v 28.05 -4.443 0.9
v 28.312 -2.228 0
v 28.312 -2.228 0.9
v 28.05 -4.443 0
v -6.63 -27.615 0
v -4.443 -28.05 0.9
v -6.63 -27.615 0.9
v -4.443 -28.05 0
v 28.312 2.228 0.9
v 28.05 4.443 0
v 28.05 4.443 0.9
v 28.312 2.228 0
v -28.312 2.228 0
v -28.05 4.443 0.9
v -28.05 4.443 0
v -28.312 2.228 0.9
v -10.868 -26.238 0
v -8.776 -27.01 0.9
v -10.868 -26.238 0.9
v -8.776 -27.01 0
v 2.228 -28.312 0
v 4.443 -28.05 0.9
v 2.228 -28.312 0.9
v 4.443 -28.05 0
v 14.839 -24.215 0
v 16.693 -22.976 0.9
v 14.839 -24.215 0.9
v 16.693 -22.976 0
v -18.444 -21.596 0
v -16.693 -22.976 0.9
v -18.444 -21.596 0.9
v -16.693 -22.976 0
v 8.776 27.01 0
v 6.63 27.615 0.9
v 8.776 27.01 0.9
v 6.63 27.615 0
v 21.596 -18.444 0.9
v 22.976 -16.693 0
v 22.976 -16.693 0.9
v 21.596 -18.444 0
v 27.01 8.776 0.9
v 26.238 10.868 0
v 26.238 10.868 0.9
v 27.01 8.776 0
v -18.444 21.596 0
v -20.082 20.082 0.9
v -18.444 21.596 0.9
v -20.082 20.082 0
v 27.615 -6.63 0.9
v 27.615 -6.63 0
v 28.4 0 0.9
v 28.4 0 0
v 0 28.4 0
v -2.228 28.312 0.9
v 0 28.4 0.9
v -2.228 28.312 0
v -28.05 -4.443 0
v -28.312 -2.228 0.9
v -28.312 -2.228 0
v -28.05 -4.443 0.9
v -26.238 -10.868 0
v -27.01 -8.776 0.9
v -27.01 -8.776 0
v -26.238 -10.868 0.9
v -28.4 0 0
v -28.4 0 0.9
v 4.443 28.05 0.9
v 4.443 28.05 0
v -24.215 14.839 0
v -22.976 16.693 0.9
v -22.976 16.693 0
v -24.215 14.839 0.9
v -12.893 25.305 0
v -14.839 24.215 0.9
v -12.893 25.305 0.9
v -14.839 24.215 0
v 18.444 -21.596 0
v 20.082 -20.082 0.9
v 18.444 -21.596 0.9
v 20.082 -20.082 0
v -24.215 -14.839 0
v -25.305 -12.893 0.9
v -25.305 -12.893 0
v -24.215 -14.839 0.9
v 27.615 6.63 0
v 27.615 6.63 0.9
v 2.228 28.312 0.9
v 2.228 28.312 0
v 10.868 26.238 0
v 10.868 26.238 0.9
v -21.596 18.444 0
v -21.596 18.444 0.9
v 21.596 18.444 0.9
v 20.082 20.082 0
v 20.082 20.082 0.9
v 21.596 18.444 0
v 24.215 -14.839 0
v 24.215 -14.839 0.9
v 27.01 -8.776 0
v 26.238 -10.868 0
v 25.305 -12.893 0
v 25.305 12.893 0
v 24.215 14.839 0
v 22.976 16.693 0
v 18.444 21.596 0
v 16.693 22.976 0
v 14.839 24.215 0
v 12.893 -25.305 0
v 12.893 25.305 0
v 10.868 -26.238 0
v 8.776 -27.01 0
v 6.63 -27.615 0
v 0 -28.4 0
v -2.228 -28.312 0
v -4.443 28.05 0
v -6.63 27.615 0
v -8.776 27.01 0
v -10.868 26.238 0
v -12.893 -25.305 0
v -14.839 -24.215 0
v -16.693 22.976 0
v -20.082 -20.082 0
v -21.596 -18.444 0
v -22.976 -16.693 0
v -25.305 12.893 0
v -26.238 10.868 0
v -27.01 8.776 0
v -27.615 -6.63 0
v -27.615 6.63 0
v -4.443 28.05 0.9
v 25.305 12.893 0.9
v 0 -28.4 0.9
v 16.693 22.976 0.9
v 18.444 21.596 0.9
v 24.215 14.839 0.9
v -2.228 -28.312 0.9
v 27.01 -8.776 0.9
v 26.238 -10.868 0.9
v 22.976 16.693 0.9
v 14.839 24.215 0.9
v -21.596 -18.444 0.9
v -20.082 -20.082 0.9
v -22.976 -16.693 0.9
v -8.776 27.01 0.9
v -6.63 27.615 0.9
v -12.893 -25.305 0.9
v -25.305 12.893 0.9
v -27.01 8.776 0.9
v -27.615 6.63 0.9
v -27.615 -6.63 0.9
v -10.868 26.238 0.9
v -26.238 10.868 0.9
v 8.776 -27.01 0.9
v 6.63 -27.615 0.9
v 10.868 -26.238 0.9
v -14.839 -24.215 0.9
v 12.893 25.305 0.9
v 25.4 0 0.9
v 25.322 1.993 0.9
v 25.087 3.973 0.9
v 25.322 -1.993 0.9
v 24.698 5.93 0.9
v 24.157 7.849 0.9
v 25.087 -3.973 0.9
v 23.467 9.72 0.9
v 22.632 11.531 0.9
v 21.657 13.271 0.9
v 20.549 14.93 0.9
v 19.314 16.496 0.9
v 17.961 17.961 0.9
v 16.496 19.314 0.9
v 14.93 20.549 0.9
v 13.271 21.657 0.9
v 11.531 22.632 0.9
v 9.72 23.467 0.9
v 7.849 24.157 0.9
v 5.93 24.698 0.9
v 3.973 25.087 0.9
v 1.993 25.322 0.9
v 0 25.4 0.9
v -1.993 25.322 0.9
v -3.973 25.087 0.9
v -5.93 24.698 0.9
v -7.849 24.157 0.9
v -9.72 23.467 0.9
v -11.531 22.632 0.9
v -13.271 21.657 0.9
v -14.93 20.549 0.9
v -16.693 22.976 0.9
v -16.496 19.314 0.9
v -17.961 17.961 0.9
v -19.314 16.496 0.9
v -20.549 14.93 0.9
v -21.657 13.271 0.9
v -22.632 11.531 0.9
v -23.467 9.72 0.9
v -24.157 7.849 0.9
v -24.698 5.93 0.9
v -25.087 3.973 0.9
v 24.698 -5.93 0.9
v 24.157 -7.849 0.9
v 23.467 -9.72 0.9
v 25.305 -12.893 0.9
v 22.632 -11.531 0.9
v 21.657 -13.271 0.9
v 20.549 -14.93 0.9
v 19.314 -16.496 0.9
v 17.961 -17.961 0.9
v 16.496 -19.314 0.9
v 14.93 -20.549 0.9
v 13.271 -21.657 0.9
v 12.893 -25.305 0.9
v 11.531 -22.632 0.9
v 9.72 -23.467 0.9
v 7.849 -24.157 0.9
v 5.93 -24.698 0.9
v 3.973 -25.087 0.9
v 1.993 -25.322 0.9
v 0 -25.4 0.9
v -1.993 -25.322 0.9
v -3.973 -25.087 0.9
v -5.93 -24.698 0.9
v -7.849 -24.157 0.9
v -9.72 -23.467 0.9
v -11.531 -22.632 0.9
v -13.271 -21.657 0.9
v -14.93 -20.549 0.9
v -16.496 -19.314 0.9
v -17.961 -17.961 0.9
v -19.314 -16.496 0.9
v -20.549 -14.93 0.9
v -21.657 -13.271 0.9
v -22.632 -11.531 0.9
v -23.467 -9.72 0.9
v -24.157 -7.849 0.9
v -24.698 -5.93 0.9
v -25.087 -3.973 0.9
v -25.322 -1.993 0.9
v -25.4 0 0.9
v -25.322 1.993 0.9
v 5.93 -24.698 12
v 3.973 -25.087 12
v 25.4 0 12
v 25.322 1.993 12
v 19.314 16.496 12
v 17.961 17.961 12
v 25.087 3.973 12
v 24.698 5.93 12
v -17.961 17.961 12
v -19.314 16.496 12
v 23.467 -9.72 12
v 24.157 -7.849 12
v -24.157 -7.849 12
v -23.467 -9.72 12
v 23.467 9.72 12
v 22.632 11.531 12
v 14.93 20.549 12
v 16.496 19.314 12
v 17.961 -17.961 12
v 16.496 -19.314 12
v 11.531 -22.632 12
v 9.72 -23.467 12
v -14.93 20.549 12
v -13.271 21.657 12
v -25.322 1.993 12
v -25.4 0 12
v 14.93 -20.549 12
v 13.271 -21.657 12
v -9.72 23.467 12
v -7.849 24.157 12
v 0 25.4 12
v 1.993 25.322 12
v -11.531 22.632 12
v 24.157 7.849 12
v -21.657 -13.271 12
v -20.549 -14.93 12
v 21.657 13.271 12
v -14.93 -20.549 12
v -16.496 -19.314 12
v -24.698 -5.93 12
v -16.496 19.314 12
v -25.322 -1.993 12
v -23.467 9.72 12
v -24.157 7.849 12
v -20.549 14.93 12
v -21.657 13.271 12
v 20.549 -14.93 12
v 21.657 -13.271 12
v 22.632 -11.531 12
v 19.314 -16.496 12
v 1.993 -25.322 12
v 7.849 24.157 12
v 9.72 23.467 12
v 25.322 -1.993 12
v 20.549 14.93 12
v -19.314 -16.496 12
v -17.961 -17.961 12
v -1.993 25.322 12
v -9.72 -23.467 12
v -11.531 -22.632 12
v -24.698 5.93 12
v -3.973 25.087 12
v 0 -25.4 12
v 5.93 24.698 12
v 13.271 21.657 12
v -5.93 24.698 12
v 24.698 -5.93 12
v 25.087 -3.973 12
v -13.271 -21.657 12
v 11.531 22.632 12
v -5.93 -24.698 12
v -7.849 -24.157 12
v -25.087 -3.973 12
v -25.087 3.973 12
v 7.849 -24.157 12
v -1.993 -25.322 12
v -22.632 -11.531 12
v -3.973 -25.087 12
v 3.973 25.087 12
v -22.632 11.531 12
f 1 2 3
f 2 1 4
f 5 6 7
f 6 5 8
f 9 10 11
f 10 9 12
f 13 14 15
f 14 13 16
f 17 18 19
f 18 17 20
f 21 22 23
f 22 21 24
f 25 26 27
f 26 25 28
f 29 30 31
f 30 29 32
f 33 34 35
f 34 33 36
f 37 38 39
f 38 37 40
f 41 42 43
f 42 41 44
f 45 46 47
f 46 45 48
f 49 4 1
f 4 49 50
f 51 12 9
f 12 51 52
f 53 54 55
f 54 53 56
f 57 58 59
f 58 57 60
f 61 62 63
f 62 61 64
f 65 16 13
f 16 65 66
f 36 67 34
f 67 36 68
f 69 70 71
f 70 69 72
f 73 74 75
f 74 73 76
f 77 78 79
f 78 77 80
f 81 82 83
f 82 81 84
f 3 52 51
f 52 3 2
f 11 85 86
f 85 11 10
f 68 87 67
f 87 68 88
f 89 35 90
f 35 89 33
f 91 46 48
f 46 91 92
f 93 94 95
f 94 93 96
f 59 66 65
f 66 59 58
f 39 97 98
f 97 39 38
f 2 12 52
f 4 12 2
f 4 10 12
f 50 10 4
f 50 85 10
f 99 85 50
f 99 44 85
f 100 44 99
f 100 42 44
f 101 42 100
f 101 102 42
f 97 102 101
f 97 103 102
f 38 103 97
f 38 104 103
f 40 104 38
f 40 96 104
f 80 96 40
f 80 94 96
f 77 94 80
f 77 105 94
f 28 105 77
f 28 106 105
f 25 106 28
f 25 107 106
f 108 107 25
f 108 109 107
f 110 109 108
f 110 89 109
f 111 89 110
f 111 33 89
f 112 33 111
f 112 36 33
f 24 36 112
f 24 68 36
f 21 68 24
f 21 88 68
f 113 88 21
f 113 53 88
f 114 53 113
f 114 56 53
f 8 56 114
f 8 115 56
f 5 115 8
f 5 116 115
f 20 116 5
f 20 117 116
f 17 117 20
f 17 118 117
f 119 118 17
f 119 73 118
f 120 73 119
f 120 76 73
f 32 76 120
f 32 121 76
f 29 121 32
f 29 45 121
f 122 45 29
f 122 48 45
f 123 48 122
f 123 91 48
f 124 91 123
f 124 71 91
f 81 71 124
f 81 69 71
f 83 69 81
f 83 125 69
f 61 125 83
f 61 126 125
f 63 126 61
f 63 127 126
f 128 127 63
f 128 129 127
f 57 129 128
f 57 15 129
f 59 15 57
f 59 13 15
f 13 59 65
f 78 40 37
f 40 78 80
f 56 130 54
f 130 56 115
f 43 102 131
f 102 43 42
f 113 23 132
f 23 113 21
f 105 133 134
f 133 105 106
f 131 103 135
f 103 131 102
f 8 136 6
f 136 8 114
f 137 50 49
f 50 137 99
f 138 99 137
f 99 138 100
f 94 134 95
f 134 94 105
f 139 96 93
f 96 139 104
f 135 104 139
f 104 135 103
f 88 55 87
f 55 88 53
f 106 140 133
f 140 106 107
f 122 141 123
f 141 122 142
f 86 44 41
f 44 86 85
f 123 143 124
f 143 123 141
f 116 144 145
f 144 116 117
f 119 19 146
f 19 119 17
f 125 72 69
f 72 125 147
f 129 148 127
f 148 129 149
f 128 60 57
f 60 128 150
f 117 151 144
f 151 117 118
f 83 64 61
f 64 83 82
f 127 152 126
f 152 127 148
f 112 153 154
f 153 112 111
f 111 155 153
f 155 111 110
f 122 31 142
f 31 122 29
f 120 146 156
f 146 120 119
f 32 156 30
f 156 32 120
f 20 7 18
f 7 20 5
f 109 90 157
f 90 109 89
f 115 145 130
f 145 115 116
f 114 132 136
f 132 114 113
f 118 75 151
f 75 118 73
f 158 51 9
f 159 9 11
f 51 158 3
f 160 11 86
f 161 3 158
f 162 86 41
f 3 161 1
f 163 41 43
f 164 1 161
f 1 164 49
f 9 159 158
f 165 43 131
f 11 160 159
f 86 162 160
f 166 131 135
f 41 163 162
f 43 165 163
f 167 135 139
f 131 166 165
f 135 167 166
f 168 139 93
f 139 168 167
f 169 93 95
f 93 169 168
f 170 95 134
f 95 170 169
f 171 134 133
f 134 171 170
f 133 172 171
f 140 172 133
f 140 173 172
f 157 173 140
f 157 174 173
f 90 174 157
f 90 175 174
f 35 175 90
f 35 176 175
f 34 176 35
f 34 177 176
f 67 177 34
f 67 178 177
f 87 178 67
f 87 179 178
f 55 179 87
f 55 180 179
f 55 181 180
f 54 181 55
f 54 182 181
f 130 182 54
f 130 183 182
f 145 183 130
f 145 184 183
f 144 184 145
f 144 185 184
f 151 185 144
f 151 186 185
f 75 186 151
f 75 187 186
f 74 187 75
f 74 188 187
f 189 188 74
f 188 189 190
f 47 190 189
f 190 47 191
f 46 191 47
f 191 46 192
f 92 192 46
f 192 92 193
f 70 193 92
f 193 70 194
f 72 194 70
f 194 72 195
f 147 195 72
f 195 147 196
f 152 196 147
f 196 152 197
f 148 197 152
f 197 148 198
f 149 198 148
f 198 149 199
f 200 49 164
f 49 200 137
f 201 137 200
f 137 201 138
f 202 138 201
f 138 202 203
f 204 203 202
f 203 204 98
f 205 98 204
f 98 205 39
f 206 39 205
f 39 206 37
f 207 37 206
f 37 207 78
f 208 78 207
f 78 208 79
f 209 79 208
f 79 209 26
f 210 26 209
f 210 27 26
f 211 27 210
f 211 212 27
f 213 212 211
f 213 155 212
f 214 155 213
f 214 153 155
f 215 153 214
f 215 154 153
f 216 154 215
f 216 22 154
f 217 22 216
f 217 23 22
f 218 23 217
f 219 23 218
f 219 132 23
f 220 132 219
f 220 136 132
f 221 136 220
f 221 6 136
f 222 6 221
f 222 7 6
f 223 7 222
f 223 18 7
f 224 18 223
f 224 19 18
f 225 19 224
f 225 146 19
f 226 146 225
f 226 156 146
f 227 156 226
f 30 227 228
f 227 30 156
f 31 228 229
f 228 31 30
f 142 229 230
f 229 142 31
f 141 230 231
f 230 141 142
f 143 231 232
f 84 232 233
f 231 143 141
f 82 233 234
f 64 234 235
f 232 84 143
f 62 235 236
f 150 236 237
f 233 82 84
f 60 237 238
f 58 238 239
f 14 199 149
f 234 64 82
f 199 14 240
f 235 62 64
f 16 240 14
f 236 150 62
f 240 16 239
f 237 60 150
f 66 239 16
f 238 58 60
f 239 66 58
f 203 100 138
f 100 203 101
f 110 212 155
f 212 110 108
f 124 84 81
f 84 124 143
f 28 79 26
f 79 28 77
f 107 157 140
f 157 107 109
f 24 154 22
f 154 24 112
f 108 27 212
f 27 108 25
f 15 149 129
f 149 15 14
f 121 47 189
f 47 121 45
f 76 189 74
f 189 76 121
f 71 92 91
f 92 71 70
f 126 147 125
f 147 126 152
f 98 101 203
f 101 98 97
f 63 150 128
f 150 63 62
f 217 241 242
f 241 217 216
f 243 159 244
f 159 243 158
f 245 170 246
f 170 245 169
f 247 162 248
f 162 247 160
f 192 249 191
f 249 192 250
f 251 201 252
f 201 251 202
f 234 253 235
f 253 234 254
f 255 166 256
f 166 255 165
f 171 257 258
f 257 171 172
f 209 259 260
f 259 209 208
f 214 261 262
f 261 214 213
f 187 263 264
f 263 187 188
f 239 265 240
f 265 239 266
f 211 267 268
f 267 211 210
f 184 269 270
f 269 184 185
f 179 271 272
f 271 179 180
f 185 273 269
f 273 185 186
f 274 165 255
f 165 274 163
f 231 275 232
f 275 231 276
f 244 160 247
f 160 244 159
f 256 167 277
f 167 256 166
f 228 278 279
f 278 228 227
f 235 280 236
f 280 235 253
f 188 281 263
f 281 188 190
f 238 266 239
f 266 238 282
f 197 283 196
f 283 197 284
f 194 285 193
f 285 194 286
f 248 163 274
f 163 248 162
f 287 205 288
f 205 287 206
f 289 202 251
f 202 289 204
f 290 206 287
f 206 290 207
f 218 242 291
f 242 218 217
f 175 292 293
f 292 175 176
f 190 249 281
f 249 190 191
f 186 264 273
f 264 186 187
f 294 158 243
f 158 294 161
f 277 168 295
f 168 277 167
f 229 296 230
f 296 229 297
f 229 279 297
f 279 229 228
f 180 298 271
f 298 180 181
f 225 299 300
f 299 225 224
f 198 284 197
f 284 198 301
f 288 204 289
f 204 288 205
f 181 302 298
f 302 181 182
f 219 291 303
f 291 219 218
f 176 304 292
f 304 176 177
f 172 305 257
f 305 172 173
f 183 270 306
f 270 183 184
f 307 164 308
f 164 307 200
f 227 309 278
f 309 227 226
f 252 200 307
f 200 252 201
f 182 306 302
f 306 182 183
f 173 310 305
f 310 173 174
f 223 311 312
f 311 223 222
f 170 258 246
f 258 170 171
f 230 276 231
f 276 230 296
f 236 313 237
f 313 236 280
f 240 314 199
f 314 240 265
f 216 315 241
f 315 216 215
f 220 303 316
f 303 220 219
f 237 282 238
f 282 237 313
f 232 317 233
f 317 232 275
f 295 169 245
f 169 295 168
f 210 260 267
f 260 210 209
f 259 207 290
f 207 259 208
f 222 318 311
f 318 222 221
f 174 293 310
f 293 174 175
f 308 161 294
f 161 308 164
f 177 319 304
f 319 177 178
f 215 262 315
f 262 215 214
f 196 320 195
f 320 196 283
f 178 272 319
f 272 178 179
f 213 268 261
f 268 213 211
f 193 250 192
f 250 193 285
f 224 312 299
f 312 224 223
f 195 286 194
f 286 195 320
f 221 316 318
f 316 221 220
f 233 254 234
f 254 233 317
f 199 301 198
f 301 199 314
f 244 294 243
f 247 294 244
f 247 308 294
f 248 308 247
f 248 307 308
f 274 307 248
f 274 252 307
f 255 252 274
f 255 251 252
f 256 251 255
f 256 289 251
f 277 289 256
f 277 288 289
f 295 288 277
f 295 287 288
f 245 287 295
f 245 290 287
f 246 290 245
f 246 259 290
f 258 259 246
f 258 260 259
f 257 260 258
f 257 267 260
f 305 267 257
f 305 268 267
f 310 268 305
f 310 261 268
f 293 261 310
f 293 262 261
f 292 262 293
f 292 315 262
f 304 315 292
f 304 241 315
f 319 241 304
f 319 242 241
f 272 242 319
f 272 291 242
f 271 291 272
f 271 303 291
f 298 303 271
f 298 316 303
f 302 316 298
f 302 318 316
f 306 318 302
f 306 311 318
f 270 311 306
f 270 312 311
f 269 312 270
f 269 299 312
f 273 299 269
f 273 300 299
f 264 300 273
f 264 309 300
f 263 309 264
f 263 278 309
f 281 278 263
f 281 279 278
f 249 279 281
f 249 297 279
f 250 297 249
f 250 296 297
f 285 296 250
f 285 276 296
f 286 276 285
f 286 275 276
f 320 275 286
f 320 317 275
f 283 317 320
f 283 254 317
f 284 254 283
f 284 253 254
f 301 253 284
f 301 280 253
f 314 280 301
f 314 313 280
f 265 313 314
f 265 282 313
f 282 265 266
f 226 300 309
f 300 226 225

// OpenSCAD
hd=25.4*2;
//difference() {
cylinder(d=hd+6,h=0.9,$fn=80);
cylinder(d=hd,h=12,$fn=80);
//}
